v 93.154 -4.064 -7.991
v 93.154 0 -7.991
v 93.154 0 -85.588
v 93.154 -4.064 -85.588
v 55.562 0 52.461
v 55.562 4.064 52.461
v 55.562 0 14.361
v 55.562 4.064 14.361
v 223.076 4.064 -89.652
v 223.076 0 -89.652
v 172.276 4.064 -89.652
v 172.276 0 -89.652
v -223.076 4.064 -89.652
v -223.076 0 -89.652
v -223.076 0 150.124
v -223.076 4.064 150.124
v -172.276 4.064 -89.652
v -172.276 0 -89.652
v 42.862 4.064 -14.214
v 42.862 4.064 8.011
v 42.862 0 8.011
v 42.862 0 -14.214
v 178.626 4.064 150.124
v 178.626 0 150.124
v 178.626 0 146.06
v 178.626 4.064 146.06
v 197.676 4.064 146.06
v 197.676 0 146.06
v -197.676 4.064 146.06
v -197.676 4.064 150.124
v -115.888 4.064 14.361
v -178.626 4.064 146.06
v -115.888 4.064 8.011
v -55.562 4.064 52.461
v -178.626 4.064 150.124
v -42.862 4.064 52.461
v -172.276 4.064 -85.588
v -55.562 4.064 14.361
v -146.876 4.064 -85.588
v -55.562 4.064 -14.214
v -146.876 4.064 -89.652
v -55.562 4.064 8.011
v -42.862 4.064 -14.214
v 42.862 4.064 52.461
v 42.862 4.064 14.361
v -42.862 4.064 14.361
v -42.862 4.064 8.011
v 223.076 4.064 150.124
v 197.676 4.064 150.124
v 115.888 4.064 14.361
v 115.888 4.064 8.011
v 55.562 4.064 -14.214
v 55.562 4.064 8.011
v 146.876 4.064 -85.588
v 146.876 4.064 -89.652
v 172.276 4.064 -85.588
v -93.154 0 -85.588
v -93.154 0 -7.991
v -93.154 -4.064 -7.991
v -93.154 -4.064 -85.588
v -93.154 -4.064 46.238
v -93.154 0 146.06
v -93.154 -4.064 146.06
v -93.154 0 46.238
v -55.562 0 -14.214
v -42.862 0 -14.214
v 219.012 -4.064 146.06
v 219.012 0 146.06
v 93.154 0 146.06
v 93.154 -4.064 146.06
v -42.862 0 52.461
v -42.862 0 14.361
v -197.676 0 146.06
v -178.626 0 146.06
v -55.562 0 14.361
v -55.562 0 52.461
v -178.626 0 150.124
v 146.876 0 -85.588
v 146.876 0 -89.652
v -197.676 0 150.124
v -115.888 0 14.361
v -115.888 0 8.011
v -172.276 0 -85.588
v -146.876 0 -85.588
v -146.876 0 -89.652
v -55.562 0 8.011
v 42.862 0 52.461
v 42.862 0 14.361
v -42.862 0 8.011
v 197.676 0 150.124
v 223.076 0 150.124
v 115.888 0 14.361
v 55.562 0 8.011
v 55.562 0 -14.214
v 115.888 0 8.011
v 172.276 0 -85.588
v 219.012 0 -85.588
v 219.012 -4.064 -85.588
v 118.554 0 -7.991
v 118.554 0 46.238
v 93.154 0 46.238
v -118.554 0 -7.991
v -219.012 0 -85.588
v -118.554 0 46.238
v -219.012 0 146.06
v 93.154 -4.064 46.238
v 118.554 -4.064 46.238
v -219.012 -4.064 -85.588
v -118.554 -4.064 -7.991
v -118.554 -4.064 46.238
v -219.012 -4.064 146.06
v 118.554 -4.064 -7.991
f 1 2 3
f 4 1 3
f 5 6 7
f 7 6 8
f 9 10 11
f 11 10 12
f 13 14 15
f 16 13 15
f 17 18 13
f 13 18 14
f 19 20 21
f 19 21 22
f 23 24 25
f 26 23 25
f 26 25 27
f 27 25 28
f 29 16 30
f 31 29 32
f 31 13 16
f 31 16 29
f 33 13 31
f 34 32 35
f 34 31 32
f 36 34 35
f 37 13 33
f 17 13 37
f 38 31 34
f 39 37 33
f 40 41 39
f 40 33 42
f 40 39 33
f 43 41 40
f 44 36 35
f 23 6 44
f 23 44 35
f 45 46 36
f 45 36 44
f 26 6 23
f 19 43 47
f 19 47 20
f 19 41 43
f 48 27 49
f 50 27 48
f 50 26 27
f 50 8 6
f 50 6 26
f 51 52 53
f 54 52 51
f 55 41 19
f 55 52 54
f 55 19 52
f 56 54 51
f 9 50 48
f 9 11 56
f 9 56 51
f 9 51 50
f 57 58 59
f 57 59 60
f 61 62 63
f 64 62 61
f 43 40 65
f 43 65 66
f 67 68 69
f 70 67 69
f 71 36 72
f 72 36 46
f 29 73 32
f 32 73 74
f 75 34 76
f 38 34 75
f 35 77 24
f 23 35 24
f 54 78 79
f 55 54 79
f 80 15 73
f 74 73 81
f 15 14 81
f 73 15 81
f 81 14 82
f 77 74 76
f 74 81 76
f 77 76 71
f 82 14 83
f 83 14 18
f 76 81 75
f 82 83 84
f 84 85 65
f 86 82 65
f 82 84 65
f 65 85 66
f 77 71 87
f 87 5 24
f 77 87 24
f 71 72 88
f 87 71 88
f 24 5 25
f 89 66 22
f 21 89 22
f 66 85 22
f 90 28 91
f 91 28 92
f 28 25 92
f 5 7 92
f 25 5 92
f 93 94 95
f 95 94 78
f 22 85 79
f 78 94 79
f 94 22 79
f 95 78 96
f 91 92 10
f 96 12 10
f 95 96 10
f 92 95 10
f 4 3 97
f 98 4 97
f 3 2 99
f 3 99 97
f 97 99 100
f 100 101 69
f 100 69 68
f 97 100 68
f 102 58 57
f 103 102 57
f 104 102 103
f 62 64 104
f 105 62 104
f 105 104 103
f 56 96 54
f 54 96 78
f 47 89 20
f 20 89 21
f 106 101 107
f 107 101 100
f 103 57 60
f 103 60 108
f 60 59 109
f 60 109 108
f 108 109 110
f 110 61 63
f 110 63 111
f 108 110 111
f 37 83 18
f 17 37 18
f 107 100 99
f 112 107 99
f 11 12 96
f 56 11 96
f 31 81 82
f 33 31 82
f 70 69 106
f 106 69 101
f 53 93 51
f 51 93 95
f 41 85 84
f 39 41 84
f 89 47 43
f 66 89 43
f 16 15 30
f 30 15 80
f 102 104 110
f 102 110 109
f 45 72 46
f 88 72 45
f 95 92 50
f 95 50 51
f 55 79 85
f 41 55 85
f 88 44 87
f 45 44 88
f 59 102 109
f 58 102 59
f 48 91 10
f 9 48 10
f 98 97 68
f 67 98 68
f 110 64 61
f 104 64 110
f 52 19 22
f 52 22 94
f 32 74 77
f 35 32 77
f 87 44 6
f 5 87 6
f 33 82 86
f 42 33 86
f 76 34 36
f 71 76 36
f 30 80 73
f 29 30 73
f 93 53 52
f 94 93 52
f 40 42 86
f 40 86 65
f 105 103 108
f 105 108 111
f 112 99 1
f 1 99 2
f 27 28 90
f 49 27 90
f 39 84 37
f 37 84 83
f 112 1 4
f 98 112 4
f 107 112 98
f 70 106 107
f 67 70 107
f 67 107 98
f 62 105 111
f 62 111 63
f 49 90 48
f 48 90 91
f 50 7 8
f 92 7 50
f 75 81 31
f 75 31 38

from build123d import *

# Parameters (mm, degrees)
SKETCH1_W           = 231.775
SKETCH1_H           = 6.35
BOSS_EXTRUDE1_DEPTH = 4.064
SKETCH2_W           = 12.7
SKETCH2_H           = 66.675
CUT_EXTRUDE1_DEPTH  = 5.064
BOSS_EXTRUDE2_DEPTH = 4.064


with BuildPart() as part:
    # Sketch1 → Boss-Extrude1 (new body)
    with BuildSketch(Plane(origin=(0, 0, 0), x_dir=(1, 0, 0), z_dir=(0, 1, 0))):
        Polygon((-223.0755, -150.123783392), (-197.6755, -150.123783392), (-197.6755, -146.059783392), (-178.6255, -146.059783392), (-178.6255, -150.123783392), (178.6255, -150.123783392), (178.6255, -146.059783392), (197.6755, -146.059783392), (197.6755, -150.123783392), (223.0755, -150.123783392), (223.0755, 89.652216608), (172.2755, 89.652216608), (172.2755, 85.588216608), (146.8755, 85.588216608), (146.8755, 89.652216608), (-146.8755, 89.652216608), (-146.8755, 85.588216608), (-172.2755, 85.588216608), (-172.2755, 89.652216608), (-223.0755, 89.652216608), align=None)
        with Locations((0, -11.185783392)):
            Rectangle(SKETCH1_W, SKETCH1_H, mode=Mode.SUBTRACT)
    extrude(amount=BOSS_EXTRUDE1_DEPTH)

    # Sketch2 → Cut-Extrude1 (cut, through all)
    with BuildSketch(Plane(origin=(0, 4.064, 0), x_dir=(1, 0, 0), z_dir=(0, 1, 0))):
        with Locations((49.2125, -19.123283392)):
            Rectangle(SKETCH2_W, SKETCH2_H)
        with Locations((-49.2125, -19.123283392)):
            Rectangle(SKETCH2_W, SKETCH2_H)
    extrude(amount=-CUT_EXTRUDE1_DEPTH, mode=Mode.SUBTRACT)


with BuildPart() as body_2:
    # Sketch3 → Boss-Extrude2 (new body)
    with BuildSketch(Plane.XZ):
        Polygon((93.1545, -7.991216608), (93.1545, -85.588216608), (219.0115, -85.588216608), (219.0115, 146.059783392), (93.1545, 146.059783392), (93.1545, 46.237783392), (118.5545, 46.237783392), (118.5545, -7.991216608), align=None)
    extrude(amount=BOSS_EXTRUDE2_DEPTH)


with BuildPart() as body_3:
    # Mirror1: mirrored copy
    add(body_2.part.mirror(Plane(origin=(0, 0, 0), x_dir=(0, 0, 1), z_dir=(1, 0, 0))))


solid = Compound([part.part, body_2.part, body_3.part])
